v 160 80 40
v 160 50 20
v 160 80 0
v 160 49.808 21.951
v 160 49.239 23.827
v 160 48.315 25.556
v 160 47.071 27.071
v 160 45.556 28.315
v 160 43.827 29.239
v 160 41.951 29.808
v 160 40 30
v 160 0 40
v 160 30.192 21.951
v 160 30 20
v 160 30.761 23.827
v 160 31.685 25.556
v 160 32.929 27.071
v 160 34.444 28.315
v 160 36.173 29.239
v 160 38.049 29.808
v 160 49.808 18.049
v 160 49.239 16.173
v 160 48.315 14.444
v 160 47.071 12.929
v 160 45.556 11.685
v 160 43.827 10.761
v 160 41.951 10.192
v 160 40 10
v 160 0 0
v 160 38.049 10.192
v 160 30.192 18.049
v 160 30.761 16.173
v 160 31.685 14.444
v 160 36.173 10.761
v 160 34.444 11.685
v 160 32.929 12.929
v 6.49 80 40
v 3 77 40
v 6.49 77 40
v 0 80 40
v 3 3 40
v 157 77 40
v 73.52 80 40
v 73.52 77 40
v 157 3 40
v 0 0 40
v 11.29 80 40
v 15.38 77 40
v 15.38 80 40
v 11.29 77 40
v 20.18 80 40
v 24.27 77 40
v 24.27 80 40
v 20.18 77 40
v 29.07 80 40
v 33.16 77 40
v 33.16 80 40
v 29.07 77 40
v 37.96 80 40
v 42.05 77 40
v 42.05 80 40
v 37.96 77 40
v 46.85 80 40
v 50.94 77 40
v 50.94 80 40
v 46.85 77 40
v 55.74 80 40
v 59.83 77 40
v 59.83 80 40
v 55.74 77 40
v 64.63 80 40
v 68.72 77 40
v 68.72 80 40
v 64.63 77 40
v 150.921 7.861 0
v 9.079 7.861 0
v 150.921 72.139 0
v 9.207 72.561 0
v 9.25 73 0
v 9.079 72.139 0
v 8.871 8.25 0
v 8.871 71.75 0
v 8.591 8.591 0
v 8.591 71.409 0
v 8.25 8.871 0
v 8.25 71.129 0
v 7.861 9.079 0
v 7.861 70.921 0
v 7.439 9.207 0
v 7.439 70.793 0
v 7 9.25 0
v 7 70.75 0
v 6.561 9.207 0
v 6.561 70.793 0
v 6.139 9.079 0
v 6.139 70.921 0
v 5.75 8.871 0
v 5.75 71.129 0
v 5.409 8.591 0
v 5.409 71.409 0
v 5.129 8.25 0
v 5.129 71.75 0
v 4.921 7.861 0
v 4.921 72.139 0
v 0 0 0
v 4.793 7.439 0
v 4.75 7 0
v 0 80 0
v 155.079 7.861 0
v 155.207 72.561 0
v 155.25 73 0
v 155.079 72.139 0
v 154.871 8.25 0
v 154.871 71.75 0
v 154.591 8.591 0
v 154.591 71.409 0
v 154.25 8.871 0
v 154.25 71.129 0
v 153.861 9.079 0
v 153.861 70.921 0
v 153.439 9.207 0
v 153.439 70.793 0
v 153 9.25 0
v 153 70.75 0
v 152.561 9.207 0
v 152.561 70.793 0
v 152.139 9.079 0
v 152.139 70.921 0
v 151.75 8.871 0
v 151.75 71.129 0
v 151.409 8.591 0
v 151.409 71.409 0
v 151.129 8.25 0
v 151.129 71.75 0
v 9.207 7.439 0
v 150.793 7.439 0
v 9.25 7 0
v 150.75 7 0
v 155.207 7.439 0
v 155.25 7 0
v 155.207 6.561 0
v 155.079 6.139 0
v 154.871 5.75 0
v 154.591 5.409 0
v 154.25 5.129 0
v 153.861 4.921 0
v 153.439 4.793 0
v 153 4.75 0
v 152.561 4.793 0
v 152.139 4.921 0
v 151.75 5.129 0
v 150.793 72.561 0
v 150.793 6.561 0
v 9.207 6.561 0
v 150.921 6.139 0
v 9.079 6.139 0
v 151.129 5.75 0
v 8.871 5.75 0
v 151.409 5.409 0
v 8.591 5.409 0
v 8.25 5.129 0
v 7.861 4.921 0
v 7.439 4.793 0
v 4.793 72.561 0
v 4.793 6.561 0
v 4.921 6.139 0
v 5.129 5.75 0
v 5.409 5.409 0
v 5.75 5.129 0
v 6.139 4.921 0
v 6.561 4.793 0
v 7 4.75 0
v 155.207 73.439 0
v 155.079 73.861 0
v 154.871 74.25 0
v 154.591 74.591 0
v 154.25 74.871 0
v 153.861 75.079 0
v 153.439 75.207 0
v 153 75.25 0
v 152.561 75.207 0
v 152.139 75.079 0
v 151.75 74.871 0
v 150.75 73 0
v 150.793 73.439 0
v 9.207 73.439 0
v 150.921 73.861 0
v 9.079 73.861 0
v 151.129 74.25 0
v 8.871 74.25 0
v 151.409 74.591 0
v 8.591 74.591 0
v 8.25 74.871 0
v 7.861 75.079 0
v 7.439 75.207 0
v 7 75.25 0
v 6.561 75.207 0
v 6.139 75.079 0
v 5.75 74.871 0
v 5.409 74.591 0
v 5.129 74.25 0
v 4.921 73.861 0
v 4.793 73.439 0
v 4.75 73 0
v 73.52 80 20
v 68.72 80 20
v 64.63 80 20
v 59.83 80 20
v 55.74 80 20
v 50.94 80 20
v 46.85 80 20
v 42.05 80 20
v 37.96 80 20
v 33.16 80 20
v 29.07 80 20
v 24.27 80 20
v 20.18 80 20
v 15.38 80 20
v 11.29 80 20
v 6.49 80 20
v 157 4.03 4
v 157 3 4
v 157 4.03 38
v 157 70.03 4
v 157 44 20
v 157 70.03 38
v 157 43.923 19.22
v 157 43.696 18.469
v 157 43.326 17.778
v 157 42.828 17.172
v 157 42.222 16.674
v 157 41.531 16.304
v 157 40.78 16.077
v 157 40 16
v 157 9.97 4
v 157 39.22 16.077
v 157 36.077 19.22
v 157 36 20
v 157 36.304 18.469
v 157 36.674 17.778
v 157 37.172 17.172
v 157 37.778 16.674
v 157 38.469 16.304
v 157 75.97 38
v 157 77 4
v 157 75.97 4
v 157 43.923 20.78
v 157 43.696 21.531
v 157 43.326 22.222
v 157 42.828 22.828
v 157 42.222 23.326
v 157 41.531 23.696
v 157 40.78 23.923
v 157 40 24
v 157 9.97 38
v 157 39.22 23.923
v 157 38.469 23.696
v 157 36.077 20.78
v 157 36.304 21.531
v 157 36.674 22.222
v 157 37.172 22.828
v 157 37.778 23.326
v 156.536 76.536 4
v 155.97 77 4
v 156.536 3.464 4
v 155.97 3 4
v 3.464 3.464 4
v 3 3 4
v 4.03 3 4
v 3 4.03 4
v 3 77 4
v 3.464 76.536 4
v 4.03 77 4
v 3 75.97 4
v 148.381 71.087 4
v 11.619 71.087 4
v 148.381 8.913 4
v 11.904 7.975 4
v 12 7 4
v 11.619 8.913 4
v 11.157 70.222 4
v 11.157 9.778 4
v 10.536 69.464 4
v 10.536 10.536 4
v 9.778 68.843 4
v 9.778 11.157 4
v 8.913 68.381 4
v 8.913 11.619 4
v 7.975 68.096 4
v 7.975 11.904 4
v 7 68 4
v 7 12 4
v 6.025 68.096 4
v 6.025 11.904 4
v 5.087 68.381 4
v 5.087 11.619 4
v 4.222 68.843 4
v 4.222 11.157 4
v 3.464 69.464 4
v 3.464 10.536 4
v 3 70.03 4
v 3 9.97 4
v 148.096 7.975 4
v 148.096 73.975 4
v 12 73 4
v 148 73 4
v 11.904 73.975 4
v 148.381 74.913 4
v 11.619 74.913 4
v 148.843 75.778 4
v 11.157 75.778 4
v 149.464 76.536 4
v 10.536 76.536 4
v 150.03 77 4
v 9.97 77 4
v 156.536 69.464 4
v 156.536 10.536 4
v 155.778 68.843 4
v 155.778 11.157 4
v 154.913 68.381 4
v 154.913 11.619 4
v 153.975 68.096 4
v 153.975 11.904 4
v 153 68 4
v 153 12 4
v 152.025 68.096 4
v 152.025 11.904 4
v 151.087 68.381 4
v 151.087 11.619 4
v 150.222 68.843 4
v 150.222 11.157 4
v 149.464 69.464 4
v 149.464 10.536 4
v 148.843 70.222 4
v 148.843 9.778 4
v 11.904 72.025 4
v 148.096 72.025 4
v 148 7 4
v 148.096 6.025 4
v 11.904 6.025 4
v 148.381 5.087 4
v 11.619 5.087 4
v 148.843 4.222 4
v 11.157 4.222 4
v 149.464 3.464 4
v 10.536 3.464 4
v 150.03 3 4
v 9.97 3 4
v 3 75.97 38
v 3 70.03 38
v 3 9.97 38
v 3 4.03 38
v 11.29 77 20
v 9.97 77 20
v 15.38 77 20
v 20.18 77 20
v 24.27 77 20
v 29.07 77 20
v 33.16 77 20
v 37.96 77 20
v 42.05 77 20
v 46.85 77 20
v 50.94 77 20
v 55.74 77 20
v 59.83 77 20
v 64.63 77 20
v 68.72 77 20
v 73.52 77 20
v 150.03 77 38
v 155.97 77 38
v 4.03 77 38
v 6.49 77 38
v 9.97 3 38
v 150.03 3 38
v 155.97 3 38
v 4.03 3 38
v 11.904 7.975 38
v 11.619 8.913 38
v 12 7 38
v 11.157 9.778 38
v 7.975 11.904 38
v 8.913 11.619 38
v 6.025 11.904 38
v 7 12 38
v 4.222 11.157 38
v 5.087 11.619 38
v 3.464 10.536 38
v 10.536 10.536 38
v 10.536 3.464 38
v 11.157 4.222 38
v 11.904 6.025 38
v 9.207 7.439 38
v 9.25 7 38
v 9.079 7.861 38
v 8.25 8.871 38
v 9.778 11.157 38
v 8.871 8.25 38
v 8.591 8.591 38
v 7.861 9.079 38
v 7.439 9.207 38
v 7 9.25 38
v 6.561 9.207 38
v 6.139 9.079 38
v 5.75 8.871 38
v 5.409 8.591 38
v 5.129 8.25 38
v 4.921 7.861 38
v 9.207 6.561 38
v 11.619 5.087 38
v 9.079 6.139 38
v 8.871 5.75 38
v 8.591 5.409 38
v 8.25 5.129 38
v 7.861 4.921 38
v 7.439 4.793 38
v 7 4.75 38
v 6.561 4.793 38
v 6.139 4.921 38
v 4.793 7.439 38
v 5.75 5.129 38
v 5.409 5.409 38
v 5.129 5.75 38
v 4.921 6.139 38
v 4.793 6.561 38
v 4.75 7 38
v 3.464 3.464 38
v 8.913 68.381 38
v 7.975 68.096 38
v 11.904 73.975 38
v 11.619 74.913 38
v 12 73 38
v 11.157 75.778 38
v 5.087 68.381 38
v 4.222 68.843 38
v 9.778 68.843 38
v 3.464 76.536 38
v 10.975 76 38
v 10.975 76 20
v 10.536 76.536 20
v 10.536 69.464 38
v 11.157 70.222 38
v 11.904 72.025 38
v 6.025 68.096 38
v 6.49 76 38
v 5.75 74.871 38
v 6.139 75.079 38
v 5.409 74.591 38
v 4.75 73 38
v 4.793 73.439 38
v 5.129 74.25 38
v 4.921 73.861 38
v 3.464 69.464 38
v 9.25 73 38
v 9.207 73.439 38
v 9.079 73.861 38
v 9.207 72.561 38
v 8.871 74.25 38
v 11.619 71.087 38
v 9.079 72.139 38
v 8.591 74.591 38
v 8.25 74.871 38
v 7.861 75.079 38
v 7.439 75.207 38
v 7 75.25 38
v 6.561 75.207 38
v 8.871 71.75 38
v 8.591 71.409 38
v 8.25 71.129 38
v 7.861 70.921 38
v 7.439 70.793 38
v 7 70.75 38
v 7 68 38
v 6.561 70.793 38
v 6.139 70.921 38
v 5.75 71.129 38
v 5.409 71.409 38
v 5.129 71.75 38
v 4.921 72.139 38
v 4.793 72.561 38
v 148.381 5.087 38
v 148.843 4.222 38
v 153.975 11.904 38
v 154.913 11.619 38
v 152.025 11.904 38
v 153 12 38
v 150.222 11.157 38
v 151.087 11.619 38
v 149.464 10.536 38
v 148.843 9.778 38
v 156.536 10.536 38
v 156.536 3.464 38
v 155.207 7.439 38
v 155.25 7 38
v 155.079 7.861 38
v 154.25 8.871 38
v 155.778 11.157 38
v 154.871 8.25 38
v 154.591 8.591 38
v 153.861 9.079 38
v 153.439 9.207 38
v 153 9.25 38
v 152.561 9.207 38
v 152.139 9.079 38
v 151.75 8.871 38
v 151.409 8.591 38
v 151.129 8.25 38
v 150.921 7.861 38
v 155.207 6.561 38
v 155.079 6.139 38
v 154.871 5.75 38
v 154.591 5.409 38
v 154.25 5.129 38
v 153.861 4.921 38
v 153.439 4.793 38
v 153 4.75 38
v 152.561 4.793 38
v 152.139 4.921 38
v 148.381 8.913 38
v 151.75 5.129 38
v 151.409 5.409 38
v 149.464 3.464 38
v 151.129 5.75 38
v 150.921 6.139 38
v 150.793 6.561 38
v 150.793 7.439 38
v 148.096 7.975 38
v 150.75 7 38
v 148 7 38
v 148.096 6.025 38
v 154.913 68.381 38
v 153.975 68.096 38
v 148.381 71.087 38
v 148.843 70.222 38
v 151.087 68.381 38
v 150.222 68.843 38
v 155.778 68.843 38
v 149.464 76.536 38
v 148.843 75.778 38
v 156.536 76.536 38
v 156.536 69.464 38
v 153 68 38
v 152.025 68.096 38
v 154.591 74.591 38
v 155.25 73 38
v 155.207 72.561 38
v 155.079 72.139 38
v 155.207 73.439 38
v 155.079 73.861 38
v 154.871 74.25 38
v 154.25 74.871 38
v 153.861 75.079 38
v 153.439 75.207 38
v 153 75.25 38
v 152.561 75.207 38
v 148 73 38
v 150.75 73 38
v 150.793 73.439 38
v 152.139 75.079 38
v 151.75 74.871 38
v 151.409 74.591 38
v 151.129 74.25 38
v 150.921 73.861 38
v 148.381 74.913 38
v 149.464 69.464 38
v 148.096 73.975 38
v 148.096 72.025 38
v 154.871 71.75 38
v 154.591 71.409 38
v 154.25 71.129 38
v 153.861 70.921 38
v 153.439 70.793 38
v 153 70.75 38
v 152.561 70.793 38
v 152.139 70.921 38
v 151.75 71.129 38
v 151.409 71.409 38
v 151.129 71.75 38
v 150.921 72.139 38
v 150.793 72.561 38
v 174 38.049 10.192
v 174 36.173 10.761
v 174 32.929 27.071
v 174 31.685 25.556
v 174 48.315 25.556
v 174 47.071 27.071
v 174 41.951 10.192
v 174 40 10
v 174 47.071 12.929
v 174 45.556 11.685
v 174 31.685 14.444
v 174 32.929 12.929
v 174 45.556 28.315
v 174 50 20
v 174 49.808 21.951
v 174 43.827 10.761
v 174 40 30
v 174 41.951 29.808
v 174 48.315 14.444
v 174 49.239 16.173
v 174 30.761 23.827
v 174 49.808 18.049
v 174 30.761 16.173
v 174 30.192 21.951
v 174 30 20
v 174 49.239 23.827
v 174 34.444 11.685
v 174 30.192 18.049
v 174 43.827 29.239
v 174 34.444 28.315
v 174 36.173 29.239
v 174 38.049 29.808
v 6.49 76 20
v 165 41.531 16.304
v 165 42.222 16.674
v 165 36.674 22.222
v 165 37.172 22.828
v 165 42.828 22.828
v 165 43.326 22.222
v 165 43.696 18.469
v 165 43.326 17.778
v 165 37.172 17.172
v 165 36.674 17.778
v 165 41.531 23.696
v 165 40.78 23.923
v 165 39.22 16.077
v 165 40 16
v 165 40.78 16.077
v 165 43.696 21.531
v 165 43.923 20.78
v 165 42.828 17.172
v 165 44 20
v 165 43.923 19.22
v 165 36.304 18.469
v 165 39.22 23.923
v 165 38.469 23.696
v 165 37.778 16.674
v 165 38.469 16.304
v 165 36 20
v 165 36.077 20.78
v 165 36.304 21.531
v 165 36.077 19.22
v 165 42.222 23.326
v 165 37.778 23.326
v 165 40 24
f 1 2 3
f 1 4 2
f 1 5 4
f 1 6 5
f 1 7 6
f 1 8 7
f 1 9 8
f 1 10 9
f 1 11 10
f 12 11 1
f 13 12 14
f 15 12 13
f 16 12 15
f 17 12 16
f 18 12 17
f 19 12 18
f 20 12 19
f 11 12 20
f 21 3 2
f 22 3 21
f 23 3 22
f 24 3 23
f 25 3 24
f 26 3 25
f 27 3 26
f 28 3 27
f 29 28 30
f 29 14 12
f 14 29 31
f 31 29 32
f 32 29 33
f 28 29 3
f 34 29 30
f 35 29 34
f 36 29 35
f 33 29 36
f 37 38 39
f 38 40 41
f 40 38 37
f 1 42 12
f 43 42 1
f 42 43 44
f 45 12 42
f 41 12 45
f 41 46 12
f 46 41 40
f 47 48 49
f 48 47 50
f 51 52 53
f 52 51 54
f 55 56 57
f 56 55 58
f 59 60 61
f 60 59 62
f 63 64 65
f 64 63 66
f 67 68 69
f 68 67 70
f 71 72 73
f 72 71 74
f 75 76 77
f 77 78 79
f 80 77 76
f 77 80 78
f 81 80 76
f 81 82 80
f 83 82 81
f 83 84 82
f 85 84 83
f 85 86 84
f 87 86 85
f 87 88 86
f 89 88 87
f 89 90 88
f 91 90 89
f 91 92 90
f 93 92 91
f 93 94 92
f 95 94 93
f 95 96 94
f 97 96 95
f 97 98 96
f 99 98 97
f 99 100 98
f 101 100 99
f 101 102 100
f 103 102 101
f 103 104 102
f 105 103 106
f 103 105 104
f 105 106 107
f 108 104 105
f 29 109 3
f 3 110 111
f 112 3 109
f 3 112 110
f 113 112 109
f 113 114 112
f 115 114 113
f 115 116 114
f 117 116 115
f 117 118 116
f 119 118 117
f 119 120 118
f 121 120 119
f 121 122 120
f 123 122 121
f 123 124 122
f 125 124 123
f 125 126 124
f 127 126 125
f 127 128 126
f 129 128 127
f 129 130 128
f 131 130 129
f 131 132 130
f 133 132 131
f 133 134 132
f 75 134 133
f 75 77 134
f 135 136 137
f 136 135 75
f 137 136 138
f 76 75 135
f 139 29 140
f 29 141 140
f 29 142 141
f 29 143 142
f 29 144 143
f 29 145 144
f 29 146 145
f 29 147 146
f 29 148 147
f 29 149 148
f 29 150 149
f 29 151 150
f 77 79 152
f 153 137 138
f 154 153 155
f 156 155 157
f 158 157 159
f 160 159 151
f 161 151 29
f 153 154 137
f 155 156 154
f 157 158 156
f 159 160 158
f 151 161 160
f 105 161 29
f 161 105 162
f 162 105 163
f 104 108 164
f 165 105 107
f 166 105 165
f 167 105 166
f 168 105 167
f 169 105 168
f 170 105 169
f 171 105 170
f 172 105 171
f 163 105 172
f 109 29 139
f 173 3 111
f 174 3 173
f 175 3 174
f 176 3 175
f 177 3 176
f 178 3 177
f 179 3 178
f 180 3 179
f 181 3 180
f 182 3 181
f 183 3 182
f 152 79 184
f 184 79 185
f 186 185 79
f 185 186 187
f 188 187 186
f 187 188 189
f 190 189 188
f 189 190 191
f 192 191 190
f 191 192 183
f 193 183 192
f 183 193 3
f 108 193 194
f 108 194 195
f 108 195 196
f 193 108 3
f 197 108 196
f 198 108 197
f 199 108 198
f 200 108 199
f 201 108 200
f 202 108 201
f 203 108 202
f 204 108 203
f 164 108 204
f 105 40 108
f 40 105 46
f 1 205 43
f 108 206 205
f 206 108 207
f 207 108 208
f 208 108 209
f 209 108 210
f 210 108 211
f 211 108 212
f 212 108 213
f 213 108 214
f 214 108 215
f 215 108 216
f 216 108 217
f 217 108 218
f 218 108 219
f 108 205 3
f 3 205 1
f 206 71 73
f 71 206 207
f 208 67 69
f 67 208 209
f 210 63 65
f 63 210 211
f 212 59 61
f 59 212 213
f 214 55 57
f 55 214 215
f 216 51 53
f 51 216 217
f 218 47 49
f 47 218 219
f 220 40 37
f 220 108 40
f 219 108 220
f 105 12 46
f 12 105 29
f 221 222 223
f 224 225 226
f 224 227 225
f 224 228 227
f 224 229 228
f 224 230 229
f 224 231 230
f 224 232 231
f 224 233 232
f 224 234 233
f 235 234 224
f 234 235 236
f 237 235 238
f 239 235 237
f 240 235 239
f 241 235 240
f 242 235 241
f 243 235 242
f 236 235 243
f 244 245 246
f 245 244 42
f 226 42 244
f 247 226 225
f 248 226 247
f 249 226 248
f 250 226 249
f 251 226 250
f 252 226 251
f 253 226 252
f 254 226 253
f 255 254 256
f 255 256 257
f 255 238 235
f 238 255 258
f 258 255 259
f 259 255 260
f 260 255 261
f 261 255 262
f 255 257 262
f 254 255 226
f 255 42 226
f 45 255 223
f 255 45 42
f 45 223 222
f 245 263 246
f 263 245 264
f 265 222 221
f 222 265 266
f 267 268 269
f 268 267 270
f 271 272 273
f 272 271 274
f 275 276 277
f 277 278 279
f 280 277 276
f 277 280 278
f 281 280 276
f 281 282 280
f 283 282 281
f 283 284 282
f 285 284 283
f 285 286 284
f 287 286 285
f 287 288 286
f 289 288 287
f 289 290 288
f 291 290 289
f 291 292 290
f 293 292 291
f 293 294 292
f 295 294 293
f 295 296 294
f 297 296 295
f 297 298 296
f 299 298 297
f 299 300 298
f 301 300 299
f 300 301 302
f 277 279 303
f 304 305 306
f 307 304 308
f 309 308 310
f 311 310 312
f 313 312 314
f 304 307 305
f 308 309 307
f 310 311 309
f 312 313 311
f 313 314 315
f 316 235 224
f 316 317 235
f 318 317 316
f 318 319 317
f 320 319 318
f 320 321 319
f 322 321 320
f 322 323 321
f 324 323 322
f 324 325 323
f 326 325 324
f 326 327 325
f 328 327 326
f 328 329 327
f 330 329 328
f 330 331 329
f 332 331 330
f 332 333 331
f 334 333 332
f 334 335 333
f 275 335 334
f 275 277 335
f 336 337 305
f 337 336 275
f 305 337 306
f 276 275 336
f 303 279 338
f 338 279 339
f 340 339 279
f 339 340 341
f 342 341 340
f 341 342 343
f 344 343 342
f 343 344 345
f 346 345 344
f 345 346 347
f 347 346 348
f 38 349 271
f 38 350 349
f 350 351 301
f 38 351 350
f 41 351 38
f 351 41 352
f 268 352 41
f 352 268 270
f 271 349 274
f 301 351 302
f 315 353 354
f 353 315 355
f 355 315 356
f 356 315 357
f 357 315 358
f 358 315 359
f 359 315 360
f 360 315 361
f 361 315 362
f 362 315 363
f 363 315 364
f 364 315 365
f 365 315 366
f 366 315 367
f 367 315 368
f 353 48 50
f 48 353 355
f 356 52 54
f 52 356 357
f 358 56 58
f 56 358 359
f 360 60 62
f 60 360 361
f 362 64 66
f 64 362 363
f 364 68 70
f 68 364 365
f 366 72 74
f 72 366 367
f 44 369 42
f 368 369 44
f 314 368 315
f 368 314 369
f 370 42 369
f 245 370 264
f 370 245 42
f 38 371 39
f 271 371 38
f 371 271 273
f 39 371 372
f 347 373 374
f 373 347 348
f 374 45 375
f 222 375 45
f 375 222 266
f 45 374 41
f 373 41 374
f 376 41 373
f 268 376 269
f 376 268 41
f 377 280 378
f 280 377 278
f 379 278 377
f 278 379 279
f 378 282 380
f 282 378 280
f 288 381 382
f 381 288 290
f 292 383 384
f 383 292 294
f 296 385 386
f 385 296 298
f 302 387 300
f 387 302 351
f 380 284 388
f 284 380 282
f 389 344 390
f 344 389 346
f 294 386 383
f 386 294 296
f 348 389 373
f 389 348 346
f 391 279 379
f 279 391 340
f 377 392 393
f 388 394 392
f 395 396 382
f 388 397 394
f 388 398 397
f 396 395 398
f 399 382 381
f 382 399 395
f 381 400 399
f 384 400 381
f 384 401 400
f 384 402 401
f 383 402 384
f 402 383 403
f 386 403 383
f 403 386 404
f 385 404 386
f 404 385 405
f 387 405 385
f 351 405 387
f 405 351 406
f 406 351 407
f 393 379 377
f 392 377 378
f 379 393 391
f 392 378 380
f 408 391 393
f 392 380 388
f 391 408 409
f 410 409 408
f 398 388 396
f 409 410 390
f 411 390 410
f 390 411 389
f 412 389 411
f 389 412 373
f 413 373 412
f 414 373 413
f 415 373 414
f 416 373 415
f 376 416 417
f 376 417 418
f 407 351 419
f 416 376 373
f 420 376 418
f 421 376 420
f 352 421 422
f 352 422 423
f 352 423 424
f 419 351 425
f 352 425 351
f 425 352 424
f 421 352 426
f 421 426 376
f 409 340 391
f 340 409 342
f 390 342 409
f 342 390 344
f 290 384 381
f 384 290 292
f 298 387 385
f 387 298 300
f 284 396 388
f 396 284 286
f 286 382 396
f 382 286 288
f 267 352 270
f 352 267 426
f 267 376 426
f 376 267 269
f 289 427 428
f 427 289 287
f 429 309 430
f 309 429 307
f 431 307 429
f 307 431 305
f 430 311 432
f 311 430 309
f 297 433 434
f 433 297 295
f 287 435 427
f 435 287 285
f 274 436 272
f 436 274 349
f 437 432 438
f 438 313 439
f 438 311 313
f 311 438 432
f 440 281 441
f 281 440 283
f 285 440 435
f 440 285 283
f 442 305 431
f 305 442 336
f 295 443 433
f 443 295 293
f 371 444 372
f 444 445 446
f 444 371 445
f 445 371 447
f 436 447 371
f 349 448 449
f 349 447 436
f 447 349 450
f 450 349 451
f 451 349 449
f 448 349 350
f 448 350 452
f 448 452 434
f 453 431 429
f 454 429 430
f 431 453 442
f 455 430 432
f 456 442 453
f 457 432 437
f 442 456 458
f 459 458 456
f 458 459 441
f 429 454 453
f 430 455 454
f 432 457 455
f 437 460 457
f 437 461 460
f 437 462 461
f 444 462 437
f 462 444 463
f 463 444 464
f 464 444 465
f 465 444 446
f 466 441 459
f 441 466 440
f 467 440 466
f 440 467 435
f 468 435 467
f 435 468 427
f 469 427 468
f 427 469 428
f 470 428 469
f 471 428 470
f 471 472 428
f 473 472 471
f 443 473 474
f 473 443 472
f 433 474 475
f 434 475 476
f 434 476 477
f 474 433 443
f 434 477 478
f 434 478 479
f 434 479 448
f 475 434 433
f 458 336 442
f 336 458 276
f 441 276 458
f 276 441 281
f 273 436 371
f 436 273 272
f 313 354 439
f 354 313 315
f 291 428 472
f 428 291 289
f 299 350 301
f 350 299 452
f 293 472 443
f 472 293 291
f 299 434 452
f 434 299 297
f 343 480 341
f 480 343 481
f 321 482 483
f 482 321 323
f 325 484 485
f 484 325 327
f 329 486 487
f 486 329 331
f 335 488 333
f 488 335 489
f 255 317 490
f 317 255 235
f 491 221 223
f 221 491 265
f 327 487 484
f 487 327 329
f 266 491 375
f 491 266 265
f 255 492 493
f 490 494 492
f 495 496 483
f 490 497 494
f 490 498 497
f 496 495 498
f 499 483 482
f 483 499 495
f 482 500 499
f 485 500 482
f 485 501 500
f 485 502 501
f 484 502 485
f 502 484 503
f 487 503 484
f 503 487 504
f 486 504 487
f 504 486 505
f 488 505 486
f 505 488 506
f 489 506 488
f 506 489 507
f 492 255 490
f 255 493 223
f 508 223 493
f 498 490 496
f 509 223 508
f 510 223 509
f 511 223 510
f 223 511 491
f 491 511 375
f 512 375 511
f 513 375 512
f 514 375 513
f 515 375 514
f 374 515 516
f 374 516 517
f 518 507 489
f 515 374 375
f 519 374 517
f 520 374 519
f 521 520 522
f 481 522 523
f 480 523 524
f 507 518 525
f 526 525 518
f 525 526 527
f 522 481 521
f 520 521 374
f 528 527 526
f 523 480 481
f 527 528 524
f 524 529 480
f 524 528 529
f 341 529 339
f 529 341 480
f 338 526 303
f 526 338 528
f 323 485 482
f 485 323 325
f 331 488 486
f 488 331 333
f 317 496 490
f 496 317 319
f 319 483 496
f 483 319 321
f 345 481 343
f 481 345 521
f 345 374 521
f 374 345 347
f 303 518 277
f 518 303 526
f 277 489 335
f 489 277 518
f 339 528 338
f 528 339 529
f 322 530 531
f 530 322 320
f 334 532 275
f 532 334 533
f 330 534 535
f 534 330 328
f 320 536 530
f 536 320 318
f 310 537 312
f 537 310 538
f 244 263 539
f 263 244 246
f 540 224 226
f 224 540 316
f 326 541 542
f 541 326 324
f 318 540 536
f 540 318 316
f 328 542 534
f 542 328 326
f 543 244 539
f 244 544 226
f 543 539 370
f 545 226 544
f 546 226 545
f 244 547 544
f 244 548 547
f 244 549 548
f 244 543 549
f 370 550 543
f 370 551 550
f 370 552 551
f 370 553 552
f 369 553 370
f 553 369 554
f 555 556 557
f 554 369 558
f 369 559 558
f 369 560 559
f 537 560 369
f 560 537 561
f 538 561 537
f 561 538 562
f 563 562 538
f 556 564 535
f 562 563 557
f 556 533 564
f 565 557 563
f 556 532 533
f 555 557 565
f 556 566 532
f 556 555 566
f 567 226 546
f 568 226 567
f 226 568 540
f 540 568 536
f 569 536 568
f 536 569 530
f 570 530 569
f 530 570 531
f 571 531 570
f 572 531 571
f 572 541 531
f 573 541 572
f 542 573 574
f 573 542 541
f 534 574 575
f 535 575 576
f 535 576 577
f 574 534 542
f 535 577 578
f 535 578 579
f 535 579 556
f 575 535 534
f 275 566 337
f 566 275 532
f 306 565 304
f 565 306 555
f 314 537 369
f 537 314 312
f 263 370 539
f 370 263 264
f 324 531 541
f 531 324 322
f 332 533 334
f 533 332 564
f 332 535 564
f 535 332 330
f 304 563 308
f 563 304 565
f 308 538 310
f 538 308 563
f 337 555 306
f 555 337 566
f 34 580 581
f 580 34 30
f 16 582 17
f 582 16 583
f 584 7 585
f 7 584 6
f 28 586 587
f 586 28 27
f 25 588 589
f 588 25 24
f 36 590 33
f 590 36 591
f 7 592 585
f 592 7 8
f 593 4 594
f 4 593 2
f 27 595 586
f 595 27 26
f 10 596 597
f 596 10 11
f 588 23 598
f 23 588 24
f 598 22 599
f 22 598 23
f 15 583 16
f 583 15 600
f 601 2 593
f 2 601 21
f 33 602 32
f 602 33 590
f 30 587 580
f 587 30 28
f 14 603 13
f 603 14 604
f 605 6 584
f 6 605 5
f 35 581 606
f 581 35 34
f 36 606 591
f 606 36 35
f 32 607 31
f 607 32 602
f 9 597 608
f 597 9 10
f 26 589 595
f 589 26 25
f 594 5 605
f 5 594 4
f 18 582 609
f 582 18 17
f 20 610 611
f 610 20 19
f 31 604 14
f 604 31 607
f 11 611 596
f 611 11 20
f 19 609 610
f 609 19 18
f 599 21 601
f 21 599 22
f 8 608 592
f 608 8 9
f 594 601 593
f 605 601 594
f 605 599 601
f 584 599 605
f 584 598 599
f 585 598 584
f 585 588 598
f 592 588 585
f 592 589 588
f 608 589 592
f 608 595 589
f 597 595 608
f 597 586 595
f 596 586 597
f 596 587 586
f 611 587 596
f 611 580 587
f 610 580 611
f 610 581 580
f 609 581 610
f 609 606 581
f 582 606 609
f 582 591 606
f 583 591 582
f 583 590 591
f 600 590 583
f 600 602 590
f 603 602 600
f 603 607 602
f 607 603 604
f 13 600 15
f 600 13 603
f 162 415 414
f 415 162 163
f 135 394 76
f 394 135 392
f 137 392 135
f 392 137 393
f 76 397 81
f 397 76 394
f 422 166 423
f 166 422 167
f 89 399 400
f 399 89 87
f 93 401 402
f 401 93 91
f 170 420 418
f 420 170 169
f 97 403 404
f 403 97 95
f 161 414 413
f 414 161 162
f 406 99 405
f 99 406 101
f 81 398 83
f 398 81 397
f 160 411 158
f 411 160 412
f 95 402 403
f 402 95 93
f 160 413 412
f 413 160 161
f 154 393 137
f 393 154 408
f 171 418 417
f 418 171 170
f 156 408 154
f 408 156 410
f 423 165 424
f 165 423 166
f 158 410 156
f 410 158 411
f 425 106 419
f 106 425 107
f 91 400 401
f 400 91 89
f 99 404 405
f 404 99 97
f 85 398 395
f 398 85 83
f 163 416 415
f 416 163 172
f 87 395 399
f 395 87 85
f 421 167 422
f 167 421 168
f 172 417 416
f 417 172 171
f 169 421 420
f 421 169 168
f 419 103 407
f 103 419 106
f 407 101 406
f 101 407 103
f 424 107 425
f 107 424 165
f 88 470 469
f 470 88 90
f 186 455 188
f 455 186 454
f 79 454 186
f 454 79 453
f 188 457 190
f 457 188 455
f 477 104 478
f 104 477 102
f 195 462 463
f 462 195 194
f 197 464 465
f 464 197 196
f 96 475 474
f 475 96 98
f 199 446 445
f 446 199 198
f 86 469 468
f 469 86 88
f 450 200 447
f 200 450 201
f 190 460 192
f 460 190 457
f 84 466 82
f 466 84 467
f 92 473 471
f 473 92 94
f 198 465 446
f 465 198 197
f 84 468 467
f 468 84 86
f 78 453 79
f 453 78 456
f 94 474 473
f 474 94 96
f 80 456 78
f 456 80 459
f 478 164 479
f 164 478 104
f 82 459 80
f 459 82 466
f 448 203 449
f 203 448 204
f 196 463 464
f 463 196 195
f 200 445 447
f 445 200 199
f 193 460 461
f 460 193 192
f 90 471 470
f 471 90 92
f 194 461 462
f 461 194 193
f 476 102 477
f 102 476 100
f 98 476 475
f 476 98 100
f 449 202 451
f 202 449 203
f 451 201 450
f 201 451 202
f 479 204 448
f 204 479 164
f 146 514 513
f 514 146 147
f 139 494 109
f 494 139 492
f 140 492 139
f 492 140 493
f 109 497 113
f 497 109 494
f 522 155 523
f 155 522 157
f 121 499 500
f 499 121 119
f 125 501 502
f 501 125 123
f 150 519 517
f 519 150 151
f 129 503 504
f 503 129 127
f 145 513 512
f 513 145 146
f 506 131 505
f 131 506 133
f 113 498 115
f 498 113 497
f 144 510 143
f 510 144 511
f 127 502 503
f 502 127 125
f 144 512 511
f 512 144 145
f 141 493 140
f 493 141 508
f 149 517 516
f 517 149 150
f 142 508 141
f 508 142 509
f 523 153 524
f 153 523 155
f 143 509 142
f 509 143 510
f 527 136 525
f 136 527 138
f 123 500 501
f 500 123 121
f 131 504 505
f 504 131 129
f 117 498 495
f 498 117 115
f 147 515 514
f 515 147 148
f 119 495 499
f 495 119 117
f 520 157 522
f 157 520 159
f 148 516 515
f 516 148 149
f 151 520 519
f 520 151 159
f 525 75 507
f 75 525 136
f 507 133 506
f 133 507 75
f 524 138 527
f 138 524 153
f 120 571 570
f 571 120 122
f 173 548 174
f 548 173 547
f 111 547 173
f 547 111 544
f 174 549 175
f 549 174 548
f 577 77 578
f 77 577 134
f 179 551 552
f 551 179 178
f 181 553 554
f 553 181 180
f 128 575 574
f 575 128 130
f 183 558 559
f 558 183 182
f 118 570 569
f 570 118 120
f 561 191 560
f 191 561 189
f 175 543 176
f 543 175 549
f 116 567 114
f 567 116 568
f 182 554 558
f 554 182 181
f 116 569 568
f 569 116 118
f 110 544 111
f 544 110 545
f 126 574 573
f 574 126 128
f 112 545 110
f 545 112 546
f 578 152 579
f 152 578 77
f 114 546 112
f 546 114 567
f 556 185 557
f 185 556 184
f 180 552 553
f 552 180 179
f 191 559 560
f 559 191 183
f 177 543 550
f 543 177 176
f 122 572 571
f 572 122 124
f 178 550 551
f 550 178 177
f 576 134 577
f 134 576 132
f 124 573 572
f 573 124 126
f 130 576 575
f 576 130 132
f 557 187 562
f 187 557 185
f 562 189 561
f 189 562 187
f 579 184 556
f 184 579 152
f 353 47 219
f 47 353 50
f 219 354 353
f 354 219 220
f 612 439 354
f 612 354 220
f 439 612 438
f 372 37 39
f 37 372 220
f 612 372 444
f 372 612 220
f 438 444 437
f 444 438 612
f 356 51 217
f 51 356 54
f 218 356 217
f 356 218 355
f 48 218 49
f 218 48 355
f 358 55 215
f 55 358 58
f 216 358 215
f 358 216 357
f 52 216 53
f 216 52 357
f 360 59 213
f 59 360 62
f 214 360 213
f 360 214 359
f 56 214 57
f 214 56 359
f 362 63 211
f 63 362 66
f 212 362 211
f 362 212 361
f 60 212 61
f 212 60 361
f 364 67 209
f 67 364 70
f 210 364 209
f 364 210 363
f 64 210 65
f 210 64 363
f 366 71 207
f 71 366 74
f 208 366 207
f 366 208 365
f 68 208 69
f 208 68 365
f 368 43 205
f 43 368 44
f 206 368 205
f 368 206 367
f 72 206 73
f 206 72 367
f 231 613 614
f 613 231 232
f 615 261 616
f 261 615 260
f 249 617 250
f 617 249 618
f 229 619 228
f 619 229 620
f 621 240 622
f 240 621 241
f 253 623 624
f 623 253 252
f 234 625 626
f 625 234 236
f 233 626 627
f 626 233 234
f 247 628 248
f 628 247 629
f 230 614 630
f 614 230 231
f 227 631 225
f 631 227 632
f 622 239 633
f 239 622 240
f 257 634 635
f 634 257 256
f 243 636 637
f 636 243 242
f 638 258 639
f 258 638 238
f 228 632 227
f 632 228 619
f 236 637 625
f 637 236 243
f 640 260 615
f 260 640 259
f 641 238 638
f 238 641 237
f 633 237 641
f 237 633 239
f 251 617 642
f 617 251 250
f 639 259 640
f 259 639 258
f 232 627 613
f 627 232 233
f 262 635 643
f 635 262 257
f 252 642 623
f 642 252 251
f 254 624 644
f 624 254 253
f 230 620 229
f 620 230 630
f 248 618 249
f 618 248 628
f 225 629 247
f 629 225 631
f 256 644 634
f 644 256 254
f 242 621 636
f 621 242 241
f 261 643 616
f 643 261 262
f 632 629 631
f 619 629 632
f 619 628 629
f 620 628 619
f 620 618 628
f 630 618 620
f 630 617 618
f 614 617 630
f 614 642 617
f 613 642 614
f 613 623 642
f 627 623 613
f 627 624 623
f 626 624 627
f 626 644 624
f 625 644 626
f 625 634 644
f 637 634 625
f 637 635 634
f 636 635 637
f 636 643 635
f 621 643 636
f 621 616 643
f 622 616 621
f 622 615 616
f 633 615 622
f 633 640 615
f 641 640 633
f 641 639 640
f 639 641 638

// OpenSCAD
$fn = 32;

// ----------------------------------------------------------------------
// Enclosure body: 160 x 80 x 40 mm, wall 3 mm
// ----------------------------------------------------------------------

// --- parameters (mm) ---
length = 160;             // outside length, X
width = 80;               // outside width, Y
height = 40;              // outside height, Z
wall = 3;                 // side wall thickness
floor_t = 4;              // floor thickness
boss_d = 10;              // corner boss diameter
boss_h = 34;              // corner boss height above the floor
boss_hole_d = 4.5;        // lid screw clearance in the boss
boss_lip = 7;             // boss centre inset from the corner
vent_slots = 8;           // vent slots in the long wall
vent_w = 4.8;             // vent slot width
vent_h = 20;              // vent slot height
vent_pitch = 8.89;        // vent slot pitch
vent_z = 20;              // vent slot sill height
nipple_d = 20;            // cable gland boss diameter
nipple_h = 14;            // cable gland boss height
nipple_bore = 8;          // cable gland bore

module shell() {
  difference() {
    cube([length, width, height]);
    /* hollow, open at the top */
    translate([wall, wall, floor_t])
      cube([length - 2 * wall, width - 2 * wall, height]);
  }
}

module bosses() {
  /* corner bosses, sunk 1 mm into the floor */
  for (sx = [0, 1]) for (sy = [0, 1])
    translate([sx * (length - 2 * boss_lip) + boss_lip, sy * (width - 2 * boss_lip) + boss_lip, floor_t - 1])
      cylinder(h = boss_h + 1, d = boss_d);
}

module gland() {
  /* boss on the short wall, sunk 1 mm into it */
  translate([length - 1, width / 2, height * 0.5]) rotate([0, 90, 0])
    cylinder(h = nipple_h + 1, d = nipple_d);
}

difference() {
  union() {
    shell();
    bosses();
    gland();
  }
  /* boss screw holes */
  for (sx = [0, 1]) for (sy = [0, 1])
    translate([sx * (length - 2 * boss_lip) + boss_lip, sy * (width - 2 * boss_lip) + boss_lip, -1]) cylinder(h = floor_t + boss_h + 2, d = boss_hole_d);
  /* vent grille in the +Y wall */
  for (i = [0 : vent_slots - 1]) translate([vent_pitch * (i + 1) - vent_w / 2, width - wall - 1, vent_z]) cube([vent_w, wall + 2, vent_h]);
  translate([length, width / 2, height * 0.5]) rotate([0, 90, 0]) translate([0, 0, -nipple_h - 2]) cylinder(h = nipple_h + wall + 4, d = nipple_bore);
}
